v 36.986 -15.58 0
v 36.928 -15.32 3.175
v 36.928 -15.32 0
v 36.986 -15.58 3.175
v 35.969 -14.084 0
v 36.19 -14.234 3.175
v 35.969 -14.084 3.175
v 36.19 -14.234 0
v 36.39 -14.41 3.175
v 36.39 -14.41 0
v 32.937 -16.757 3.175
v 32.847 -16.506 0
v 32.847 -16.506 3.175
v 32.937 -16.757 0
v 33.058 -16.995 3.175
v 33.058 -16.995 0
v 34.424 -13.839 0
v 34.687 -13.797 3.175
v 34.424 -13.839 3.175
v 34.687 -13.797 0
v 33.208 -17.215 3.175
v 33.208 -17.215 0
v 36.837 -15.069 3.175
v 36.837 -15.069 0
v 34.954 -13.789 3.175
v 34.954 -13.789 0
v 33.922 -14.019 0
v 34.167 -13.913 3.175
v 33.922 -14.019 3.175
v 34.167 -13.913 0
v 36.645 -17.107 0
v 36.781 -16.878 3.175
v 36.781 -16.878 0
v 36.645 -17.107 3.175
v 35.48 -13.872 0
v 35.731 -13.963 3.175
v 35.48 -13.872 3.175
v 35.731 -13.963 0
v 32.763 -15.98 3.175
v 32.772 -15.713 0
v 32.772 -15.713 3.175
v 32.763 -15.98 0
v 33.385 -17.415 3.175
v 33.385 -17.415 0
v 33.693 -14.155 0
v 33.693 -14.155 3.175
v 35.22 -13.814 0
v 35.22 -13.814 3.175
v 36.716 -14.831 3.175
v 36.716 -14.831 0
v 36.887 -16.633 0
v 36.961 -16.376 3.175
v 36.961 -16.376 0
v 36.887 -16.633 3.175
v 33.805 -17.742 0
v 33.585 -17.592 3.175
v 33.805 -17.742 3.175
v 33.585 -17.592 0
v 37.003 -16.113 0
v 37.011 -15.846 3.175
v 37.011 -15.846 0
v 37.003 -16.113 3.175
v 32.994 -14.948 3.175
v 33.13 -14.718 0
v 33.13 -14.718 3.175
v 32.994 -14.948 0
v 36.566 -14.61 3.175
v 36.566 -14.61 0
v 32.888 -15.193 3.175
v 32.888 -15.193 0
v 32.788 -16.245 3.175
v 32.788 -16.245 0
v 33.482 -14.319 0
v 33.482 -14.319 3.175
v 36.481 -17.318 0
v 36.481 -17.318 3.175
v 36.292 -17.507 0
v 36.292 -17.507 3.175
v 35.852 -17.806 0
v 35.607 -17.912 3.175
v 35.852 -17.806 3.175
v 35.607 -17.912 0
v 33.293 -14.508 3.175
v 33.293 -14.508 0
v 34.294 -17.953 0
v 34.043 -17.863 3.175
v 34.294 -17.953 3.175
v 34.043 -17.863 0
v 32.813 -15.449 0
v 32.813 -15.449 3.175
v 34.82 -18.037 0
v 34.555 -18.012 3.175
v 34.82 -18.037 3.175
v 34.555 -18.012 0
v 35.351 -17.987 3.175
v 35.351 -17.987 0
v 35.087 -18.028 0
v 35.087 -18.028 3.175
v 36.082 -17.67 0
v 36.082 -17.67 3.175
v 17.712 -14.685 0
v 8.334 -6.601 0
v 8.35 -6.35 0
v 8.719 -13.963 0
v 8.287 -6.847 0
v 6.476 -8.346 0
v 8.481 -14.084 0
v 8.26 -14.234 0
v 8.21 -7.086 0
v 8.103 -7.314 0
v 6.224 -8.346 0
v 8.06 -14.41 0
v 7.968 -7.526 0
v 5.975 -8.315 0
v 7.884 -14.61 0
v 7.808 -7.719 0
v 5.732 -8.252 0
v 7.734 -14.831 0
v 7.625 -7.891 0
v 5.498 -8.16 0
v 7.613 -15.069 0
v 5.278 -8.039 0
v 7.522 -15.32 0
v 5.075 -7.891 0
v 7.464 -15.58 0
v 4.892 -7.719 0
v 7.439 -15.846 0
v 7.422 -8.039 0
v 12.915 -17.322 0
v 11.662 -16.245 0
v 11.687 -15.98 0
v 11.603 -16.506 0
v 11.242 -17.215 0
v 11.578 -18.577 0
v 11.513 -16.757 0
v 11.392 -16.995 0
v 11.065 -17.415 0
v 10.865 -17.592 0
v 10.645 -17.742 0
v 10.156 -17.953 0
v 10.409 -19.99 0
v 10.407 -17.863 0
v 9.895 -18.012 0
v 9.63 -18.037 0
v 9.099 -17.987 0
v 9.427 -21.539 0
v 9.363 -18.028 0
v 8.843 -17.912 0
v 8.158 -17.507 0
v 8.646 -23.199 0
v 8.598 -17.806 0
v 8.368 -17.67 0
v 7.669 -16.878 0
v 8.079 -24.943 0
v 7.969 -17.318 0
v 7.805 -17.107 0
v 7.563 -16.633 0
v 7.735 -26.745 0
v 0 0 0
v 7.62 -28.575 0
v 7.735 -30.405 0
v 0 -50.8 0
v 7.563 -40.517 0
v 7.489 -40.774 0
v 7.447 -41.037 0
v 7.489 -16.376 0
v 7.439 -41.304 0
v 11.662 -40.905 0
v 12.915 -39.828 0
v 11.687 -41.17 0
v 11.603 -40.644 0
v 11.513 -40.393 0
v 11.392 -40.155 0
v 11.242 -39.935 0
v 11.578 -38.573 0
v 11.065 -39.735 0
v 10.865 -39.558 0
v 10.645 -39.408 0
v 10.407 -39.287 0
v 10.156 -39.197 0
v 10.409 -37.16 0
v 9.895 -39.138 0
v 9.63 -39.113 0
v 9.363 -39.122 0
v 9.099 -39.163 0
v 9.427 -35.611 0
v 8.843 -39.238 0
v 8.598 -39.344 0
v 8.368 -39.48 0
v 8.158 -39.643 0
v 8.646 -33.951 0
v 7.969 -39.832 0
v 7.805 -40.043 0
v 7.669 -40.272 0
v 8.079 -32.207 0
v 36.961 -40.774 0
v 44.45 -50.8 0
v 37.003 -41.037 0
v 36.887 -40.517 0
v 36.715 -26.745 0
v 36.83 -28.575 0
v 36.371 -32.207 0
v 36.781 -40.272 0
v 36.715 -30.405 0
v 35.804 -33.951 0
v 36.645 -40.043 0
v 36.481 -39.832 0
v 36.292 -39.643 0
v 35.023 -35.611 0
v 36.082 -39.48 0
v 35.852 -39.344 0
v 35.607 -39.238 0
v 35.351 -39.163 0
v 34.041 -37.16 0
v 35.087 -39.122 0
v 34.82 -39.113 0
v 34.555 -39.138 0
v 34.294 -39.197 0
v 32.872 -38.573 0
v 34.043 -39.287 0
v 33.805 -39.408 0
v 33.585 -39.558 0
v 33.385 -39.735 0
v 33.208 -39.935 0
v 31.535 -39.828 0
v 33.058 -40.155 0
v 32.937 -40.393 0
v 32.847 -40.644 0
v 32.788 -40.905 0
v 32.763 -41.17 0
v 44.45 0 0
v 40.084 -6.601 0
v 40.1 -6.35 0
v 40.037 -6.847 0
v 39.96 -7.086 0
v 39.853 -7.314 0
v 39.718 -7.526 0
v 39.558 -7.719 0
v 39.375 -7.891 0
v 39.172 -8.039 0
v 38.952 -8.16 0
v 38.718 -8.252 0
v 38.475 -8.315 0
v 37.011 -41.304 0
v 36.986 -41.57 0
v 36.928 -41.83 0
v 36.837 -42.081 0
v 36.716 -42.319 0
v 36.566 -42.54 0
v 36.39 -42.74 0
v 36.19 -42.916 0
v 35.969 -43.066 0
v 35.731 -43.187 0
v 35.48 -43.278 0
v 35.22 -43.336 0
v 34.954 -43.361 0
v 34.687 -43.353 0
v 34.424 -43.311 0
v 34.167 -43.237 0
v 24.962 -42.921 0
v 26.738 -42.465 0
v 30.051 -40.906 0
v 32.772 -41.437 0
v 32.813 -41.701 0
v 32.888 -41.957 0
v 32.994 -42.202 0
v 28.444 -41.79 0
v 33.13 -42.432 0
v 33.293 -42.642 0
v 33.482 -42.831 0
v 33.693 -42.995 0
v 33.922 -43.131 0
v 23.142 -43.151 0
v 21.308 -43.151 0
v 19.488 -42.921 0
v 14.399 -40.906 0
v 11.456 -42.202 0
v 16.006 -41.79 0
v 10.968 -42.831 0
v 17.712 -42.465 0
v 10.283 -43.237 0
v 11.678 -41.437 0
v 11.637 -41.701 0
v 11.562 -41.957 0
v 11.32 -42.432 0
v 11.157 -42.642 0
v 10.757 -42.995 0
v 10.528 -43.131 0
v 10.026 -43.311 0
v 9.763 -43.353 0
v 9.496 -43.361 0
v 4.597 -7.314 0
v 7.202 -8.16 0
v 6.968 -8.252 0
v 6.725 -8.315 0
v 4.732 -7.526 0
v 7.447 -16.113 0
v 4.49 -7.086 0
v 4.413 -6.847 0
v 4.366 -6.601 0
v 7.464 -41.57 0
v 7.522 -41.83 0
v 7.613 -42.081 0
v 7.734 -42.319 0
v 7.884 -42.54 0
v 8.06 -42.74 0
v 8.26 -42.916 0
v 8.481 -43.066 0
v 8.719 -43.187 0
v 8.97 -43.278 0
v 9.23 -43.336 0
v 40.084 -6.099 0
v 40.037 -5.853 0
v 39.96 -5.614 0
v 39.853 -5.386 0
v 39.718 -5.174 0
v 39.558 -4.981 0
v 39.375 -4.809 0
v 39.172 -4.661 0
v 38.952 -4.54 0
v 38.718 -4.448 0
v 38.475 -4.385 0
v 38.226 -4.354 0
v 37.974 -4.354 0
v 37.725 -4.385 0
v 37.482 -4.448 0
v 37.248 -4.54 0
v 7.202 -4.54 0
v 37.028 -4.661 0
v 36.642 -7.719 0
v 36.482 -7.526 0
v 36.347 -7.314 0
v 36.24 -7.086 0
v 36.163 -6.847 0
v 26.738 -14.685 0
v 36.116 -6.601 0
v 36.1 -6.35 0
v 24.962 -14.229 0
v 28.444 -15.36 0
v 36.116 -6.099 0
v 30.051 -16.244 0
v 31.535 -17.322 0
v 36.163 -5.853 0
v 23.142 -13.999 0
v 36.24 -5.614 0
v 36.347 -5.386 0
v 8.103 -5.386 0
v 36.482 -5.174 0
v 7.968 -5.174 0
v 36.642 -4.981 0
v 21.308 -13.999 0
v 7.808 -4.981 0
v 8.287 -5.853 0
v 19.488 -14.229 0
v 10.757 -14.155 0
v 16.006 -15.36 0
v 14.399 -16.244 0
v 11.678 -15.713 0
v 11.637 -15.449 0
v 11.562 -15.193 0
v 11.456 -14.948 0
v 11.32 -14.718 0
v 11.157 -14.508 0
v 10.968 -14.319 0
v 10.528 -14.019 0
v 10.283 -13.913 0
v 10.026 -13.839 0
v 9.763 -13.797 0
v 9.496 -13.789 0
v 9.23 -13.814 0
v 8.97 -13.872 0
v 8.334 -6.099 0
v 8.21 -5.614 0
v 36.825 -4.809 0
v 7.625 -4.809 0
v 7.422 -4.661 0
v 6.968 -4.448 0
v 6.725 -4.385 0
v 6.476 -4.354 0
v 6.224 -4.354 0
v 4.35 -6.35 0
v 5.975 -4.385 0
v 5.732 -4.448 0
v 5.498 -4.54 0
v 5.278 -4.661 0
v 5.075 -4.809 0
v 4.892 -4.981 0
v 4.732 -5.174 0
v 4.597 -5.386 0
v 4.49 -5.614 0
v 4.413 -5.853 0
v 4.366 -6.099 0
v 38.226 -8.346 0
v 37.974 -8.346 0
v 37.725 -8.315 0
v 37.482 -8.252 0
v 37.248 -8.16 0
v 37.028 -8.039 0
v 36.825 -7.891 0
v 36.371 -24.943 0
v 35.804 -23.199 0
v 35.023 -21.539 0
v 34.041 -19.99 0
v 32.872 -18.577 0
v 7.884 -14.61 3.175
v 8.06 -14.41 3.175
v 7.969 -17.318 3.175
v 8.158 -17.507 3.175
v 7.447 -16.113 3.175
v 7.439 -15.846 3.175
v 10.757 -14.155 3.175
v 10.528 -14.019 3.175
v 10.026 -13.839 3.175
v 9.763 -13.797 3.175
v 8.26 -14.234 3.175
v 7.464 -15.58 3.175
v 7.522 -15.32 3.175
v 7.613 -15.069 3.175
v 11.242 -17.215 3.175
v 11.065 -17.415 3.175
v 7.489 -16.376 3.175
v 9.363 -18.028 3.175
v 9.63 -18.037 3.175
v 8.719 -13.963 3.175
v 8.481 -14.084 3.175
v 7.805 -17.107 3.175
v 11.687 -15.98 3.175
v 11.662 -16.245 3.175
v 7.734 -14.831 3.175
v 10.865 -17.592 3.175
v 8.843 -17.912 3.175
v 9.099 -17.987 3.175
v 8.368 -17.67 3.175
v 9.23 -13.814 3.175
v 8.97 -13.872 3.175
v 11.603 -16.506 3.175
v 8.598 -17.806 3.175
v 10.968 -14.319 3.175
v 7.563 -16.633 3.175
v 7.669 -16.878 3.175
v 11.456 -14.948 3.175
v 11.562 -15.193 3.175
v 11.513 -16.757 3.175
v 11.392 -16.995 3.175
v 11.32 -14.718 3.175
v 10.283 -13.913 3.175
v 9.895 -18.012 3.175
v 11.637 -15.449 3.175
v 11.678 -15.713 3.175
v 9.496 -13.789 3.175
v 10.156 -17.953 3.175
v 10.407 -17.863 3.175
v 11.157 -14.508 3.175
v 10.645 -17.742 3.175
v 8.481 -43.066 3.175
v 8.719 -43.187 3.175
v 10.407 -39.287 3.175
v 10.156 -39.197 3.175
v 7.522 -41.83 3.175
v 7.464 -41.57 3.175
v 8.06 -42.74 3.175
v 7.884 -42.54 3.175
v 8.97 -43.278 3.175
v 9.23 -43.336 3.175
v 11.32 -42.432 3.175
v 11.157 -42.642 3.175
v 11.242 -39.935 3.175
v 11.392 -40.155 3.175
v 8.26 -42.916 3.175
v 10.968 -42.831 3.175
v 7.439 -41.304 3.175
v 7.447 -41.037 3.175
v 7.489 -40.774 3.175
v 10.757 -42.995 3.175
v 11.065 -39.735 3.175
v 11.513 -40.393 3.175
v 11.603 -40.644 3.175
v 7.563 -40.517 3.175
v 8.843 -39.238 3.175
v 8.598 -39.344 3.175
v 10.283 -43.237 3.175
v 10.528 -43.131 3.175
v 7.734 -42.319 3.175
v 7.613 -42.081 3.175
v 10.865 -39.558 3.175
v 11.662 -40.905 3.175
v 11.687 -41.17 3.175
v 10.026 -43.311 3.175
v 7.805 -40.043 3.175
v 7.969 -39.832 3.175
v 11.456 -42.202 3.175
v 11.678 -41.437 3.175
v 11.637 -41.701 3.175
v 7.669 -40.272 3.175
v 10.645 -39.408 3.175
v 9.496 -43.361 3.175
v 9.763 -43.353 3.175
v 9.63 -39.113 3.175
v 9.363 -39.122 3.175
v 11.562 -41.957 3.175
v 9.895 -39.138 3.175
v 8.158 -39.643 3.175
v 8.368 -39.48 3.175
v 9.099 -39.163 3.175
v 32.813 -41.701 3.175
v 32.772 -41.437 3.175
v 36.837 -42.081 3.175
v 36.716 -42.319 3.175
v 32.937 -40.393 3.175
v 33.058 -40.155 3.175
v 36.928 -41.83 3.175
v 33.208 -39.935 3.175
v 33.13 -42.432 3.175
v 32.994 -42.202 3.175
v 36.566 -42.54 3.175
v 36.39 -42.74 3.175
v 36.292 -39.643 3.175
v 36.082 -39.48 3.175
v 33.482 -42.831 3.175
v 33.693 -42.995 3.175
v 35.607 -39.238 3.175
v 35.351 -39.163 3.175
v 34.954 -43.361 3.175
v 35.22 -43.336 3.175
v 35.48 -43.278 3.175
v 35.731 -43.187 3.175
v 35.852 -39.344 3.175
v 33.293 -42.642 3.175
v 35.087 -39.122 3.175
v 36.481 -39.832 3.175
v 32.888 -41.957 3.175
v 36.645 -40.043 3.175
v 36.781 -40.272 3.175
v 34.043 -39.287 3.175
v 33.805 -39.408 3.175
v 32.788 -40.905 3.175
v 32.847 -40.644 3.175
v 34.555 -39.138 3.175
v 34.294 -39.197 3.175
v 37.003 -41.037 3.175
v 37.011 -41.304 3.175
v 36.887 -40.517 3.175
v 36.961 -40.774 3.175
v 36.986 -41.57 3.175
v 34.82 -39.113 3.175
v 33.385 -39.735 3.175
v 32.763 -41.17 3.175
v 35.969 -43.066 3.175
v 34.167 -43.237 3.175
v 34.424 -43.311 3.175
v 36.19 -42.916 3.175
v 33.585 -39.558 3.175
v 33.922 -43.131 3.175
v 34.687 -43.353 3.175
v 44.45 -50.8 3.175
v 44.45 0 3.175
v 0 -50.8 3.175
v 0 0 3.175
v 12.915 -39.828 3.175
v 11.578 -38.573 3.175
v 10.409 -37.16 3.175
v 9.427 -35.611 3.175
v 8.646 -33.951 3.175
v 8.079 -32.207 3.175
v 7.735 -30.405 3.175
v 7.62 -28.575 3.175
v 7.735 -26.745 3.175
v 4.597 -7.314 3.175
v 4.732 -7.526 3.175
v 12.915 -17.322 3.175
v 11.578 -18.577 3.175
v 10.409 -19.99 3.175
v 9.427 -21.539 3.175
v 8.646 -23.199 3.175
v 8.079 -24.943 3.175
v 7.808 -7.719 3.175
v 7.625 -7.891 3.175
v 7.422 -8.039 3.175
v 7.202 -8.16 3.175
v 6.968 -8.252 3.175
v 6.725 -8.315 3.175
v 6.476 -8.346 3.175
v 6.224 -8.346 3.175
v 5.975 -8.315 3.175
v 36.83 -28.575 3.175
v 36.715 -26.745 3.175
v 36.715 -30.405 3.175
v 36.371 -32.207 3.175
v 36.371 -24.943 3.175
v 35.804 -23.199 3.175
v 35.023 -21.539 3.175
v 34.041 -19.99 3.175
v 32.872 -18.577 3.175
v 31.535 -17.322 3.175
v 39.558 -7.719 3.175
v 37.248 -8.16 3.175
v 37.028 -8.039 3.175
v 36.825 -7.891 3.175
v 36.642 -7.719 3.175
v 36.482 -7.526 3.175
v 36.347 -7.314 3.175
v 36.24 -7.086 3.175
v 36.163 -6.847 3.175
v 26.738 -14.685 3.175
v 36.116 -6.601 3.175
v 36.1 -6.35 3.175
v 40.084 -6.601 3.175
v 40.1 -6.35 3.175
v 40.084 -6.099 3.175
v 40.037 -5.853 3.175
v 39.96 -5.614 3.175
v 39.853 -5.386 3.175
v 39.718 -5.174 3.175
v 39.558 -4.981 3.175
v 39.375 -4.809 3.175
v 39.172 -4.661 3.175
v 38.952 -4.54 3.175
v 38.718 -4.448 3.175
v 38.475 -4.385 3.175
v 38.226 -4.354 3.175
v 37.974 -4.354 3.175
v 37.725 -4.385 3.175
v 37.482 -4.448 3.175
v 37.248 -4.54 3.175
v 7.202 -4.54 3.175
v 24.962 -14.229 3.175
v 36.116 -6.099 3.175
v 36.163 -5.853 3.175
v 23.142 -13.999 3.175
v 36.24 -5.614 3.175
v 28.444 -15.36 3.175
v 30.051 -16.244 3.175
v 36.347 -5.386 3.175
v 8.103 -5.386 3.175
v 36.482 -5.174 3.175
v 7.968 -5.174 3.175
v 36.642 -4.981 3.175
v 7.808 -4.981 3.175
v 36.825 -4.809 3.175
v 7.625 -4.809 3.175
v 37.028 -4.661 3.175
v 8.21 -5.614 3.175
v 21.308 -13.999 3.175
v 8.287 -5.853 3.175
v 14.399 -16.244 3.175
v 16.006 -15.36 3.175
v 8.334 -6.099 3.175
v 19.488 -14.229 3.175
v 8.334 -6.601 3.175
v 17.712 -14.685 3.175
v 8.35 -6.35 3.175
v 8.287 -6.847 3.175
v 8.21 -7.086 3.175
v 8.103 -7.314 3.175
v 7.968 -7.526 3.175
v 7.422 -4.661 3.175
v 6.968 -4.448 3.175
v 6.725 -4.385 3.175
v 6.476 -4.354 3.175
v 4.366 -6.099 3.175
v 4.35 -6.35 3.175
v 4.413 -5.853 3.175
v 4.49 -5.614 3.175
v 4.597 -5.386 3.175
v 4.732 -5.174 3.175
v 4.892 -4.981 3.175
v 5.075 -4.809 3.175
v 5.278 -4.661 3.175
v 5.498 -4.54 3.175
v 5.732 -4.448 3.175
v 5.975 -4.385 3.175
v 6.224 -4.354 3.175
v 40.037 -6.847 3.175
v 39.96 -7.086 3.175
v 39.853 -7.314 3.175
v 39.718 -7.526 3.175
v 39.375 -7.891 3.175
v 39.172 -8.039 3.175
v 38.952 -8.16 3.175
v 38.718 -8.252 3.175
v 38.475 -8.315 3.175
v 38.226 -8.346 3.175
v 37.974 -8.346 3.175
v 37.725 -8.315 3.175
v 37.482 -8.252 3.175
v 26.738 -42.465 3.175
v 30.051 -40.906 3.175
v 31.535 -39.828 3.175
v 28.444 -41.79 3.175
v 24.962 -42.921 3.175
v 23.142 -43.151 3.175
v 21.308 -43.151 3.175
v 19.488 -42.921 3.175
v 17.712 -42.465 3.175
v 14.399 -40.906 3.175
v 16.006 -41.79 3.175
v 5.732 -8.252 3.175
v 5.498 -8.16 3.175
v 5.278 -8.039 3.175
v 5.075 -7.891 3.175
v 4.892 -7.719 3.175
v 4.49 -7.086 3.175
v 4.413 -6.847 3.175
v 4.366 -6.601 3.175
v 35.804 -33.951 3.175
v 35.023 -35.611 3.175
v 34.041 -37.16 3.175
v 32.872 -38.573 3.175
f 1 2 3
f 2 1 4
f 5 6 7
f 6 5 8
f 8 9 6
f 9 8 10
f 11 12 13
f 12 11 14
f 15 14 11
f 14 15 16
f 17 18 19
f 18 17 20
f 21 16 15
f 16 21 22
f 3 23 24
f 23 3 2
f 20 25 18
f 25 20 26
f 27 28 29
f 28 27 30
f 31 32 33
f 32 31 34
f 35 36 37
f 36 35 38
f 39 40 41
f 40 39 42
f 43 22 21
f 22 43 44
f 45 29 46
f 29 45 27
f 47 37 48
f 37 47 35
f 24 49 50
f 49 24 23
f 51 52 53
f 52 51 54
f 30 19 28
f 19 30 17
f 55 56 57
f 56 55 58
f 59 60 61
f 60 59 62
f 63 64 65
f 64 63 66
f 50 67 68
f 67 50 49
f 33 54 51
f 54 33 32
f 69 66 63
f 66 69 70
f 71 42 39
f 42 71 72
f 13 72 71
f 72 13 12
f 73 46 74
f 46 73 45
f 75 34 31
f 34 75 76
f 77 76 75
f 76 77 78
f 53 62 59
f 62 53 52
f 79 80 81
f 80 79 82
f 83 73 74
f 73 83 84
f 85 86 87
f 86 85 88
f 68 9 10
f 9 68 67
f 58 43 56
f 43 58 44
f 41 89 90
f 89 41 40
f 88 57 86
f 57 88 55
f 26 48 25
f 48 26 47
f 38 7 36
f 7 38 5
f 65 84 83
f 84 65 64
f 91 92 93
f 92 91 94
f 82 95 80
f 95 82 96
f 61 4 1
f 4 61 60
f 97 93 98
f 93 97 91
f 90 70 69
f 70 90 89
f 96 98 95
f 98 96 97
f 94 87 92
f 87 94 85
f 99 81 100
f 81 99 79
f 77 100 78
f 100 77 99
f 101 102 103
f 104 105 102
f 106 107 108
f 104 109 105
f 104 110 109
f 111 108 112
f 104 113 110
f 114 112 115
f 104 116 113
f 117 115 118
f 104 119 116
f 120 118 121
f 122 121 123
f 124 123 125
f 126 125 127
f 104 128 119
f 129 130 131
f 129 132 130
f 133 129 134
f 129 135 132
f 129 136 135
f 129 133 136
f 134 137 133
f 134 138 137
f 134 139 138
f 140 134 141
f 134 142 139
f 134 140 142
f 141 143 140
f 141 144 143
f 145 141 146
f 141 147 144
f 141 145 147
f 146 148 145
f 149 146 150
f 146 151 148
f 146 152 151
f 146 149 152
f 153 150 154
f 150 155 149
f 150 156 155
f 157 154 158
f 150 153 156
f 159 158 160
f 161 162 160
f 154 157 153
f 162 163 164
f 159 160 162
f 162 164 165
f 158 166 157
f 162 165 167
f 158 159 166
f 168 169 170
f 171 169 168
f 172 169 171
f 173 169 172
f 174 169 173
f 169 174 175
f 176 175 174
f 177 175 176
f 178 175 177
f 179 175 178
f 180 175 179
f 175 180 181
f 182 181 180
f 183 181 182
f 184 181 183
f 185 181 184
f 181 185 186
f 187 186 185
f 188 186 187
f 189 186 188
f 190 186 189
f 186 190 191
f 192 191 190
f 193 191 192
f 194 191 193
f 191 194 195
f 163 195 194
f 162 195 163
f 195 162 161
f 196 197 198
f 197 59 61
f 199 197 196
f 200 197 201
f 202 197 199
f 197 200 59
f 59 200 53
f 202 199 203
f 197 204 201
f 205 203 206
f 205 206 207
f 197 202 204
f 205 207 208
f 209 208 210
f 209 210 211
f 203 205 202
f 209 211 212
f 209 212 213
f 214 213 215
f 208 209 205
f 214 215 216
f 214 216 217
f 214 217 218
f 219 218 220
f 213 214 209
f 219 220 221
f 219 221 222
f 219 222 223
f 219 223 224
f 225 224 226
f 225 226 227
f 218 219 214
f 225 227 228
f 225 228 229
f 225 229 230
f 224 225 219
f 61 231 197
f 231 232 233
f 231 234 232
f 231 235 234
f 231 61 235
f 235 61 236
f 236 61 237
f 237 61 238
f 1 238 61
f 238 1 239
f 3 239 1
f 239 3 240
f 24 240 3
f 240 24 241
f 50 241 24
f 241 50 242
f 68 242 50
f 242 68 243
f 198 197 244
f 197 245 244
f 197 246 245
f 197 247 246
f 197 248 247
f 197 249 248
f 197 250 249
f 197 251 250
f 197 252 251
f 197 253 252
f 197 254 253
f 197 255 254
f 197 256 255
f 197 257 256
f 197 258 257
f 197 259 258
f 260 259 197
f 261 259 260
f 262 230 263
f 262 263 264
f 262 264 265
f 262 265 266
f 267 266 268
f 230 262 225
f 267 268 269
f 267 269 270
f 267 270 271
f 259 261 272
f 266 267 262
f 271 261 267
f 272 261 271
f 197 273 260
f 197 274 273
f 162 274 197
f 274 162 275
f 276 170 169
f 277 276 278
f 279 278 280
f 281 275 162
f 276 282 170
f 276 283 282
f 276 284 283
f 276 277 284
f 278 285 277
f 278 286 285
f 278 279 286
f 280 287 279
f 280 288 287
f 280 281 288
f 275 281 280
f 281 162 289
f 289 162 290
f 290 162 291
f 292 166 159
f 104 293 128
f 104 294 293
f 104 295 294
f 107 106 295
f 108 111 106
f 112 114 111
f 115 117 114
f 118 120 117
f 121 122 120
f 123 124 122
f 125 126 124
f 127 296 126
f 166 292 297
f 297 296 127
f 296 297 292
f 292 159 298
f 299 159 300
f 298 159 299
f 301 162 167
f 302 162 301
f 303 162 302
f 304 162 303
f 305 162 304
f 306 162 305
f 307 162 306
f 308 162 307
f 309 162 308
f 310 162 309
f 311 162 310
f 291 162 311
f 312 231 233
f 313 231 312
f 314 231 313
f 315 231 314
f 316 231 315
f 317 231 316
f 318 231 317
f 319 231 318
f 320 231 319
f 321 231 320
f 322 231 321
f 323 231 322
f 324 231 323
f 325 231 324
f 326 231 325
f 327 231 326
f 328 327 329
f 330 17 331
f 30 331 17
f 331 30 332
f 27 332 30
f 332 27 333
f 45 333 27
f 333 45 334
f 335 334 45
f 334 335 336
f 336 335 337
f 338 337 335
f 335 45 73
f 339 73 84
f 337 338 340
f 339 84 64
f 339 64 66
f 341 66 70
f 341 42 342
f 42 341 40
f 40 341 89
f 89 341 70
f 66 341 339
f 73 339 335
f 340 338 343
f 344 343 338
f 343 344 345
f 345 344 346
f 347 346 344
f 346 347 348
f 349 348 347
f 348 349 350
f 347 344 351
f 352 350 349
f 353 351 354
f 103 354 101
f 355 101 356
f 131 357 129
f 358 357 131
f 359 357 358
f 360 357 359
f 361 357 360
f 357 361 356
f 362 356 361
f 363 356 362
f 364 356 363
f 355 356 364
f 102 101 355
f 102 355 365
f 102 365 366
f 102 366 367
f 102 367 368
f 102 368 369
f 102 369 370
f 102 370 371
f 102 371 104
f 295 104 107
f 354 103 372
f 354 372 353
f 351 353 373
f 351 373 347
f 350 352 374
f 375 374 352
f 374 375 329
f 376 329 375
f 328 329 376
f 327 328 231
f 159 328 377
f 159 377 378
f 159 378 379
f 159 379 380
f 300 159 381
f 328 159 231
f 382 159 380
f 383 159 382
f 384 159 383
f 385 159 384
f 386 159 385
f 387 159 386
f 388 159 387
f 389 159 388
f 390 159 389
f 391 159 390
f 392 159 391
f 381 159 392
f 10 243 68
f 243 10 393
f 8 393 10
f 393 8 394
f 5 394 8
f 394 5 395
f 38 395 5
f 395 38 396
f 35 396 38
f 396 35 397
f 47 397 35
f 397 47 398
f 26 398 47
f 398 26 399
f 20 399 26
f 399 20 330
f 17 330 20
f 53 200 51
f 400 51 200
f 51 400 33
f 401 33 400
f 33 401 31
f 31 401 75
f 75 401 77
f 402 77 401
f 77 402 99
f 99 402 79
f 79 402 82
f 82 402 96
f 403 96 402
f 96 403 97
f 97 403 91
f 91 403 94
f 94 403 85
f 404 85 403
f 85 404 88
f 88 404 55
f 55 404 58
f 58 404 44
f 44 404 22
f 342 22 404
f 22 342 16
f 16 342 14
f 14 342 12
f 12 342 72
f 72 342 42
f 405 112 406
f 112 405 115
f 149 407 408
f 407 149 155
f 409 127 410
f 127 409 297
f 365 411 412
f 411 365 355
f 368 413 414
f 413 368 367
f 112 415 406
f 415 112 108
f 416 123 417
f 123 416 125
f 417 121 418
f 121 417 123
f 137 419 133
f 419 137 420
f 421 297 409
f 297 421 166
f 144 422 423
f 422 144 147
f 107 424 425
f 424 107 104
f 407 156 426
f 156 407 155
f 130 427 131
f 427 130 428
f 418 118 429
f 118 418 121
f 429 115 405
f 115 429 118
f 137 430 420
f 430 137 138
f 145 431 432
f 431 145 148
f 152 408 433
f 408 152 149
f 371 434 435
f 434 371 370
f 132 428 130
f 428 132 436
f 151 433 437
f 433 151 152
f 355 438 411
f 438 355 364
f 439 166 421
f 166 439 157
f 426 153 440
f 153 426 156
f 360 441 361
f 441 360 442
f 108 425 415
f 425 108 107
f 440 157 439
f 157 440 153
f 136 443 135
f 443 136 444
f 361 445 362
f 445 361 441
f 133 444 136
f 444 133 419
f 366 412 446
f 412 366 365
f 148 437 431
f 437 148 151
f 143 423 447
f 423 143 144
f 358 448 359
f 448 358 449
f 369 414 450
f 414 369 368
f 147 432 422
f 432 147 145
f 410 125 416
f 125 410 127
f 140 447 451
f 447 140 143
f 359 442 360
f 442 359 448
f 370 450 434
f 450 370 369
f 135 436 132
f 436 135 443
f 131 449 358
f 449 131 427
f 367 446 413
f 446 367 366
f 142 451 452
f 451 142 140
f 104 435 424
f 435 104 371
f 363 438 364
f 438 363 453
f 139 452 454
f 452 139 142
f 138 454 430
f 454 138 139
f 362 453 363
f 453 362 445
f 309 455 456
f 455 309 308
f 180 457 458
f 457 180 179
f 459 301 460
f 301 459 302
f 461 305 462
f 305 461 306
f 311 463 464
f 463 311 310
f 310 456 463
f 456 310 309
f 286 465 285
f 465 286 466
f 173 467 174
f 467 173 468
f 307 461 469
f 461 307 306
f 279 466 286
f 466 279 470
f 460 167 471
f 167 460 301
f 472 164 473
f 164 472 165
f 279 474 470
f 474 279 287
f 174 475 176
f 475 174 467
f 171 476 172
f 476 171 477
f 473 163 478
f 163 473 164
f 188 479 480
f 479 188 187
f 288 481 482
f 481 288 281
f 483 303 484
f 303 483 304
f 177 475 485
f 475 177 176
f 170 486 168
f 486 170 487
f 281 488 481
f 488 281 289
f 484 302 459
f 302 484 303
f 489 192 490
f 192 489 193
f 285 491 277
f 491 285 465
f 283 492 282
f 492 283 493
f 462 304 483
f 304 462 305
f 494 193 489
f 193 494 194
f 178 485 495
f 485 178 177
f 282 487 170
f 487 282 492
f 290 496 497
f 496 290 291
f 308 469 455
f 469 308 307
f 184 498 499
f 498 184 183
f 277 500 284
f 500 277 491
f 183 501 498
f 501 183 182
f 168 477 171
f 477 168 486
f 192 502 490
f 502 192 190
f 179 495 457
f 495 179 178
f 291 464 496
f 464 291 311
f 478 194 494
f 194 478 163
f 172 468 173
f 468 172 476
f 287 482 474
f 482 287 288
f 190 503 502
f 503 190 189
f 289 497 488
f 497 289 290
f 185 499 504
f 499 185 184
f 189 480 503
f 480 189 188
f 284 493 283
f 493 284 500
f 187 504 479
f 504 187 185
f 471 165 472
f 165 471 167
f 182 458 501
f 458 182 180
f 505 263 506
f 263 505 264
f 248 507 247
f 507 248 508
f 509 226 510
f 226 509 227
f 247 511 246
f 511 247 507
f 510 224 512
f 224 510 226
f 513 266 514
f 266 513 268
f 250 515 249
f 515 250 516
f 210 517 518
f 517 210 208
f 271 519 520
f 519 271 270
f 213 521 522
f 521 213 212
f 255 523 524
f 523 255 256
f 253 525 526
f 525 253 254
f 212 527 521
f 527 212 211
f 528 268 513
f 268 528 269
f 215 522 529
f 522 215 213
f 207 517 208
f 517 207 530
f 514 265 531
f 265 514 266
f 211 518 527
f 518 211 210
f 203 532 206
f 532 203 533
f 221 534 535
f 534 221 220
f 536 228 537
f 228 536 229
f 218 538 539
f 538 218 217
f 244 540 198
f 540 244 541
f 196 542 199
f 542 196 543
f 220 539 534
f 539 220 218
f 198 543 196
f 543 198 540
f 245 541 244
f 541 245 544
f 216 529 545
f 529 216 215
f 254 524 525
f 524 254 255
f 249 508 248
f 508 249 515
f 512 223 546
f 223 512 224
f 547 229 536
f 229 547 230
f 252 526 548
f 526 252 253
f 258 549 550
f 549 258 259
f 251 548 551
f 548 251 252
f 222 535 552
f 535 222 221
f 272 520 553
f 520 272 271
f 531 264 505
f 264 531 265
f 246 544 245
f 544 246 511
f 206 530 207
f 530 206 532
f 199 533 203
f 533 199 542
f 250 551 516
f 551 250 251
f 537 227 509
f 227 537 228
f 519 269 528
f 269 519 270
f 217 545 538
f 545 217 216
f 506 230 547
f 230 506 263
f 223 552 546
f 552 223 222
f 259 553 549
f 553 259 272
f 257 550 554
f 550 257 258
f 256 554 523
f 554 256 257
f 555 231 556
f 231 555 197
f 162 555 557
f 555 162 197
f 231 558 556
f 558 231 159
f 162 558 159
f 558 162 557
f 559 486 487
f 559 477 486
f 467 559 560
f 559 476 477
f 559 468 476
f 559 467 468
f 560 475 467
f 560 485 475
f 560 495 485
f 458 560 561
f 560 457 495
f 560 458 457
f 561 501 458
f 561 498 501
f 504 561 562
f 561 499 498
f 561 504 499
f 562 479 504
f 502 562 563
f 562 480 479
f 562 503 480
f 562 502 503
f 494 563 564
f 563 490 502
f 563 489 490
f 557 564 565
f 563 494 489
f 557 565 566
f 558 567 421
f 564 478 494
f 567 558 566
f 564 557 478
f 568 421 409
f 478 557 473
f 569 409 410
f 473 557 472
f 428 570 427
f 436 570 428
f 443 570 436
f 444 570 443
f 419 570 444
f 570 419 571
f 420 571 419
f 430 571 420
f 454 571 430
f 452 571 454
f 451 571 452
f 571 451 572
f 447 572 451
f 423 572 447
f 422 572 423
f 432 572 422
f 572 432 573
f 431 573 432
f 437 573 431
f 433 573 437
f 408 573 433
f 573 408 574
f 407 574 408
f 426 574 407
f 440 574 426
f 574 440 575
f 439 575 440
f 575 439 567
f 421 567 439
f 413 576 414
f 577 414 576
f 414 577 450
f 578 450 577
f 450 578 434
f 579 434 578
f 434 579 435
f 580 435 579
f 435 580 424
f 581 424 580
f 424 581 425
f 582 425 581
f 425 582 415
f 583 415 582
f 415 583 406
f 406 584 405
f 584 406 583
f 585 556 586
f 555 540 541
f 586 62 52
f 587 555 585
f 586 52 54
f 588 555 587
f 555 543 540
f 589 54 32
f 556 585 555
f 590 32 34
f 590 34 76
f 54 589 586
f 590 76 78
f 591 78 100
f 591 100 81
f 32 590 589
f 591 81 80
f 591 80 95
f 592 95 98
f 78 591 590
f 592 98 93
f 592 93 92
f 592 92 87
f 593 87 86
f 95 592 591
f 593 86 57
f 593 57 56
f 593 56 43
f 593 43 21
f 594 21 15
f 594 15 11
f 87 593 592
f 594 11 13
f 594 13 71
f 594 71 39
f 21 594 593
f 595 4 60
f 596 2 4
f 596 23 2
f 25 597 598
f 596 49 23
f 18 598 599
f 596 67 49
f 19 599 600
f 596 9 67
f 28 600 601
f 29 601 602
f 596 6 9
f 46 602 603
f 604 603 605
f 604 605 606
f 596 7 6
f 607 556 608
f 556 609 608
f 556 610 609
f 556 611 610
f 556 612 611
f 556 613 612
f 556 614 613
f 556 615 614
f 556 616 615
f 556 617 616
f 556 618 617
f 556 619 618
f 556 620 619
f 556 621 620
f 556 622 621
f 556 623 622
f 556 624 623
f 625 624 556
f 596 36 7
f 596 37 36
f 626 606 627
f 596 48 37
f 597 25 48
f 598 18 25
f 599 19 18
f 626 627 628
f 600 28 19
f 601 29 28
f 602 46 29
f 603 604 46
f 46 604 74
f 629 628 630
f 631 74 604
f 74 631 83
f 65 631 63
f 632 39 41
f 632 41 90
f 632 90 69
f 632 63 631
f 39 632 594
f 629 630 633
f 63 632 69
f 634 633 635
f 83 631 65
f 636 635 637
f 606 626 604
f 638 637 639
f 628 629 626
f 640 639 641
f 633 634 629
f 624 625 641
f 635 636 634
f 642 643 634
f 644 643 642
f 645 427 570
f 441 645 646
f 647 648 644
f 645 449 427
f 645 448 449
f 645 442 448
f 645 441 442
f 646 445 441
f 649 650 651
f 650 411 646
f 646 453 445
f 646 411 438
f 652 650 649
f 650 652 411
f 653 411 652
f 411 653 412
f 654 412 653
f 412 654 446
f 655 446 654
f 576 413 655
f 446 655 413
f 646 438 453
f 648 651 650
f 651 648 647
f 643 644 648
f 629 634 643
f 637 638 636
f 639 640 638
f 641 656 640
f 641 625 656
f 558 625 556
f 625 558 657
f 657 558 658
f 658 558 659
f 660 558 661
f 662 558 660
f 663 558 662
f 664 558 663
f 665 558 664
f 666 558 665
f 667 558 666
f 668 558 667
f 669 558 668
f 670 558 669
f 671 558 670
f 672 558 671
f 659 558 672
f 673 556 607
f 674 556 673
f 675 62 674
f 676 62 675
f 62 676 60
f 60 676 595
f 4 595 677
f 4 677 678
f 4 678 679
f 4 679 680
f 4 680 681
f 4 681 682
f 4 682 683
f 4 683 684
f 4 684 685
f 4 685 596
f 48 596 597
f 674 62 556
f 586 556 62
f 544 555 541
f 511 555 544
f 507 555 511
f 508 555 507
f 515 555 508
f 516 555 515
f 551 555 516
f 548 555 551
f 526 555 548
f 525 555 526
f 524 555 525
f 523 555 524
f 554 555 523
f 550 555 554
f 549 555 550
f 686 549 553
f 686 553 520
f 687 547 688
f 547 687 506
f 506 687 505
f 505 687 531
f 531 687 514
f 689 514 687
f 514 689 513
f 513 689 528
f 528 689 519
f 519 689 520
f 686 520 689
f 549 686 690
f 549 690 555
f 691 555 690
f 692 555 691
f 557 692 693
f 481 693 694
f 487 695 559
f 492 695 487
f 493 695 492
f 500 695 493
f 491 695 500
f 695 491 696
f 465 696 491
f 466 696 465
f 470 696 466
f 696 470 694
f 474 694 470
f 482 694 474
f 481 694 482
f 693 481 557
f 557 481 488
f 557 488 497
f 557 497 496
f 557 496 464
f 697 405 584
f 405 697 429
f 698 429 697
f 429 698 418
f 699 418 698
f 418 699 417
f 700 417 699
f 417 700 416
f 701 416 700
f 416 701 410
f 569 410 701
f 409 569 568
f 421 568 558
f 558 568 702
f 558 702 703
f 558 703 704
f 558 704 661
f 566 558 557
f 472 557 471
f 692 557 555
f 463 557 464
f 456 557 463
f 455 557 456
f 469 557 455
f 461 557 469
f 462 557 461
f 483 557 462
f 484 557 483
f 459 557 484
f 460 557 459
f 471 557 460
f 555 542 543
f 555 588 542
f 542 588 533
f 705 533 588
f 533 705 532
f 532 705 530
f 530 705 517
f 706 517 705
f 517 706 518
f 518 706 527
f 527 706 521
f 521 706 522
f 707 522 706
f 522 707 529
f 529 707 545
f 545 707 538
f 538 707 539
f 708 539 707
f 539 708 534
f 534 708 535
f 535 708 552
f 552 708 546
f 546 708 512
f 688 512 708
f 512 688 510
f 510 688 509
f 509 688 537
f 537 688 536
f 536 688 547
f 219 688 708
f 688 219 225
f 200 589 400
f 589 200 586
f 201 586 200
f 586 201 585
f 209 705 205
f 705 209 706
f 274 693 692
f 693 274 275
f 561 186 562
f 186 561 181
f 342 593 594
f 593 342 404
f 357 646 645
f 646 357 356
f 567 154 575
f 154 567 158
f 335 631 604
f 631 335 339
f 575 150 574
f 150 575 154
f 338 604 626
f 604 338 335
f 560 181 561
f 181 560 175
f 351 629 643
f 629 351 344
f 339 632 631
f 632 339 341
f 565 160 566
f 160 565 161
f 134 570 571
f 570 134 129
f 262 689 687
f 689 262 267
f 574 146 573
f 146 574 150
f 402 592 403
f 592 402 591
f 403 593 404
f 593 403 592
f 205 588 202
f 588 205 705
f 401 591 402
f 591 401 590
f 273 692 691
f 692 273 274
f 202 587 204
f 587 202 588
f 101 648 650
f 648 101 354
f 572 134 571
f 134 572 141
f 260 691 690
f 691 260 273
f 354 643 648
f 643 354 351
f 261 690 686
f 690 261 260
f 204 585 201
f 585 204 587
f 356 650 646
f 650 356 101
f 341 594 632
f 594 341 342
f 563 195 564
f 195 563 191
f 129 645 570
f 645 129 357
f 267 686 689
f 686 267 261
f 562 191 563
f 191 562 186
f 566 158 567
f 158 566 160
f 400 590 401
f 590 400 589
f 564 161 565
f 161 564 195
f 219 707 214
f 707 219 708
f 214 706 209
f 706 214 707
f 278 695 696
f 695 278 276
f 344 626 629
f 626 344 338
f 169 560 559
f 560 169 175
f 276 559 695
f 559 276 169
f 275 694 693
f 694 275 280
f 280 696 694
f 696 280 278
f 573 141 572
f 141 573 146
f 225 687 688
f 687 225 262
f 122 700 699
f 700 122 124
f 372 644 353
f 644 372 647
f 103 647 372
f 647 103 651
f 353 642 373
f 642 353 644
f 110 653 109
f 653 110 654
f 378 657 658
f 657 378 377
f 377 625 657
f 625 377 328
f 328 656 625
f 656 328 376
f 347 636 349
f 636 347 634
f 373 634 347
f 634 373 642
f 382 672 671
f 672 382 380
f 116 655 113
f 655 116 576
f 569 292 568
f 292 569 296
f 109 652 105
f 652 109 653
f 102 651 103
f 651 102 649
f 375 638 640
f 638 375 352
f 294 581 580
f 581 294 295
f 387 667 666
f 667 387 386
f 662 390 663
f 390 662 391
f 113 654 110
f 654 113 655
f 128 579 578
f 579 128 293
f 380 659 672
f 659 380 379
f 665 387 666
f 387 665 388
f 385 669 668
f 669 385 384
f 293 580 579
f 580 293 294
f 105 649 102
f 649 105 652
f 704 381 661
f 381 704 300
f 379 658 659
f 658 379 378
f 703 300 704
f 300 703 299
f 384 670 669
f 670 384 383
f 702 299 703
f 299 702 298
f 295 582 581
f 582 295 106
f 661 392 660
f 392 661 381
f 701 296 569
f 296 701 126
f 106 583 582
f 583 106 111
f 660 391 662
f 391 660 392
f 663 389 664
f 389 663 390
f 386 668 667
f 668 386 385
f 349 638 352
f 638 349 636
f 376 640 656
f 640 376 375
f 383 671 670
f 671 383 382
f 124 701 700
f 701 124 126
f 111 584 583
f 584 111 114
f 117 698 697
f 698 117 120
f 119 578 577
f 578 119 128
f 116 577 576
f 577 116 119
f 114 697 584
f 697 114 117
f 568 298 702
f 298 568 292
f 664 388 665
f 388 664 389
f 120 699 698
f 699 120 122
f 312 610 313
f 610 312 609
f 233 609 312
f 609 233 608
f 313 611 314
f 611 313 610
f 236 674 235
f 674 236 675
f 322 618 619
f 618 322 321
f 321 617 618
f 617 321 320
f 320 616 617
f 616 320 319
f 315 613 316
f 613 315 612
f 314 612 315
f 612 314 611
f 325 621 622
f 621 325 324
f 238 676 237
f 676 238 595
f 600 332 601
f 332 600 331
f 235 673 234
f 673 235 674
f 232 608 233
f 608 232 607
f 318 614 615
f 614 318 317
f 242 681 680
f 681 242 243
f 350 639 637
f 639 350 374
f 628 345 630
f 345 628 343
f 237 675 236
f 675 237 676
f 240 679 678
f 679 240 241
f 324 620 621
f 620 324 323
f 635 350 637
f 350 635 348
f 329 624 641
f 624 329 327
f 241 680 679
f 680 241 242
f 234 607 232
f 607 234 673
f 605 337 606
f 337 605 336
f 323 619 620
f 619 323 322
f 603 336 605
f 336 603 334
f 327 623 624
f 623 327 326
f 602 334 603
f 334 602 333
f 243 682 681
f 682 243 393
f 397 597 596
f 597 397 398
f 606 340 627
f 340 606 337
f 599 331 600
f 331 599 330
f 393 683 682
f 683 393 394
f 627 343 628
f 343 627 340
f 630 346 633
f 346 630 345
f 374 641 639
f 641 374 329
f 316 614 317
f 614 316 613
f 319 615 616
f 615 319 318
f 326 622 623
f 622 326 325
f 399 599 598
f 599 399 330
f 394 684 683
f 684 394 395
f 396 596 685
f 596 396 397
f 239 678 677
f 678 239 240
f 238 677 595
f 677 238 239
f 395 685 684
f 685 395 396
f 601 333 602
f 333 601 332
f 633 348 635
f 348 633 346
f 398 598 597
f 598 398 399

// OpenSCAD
//mount for a andymark p71 gear box to fit in a 2"x2"x1/8"wall c-channel

in=25.4;
wbox=1.75*in;
lmotor=4*in;
face = in*1/8;
dmotor=1.772*in+2;
dshaft=1.15*in;  //large hole for the shaft surround
dholes=1.41*in; // diameter of mount holes in face
motorBoltDiam=4.25;  //diameter of the motor mount holes 
riser=in*1/4; //riser height
faceMountDiam = 4; //diameter of holes for mounting faceplate
faceMountDepth = face+0.5*in; //depth of holes for mounting faceplate.

module bolt_slots(inset=1*in, slot=1*in) {
        //bolt slots for mounting to c-channel
    bolt=0.19*in; //size of the bolt
    //#10 screw is 0.19in
    //#12 screw is 0.21in
    bolthead=0.44*in; //head size is .437", washer is .625"
    headheight=in*1/8;
    for (i=[-0.5*in, 0.5*in]) {
    translate([i+wbox/2, inset, riser-headheight]) 
        linear_extrude(h=wbox) {
            hull() {
                circle(d=bolthead);
                translate([0, slot]) circle(d=bolthead);
            }
        }
    translate([i+wbox/2, inset, 0]) 
        linear_extrude(h=riser) {
            hull() {
                circle(d=bolt);
                translate([0, slot]) circle(d=bolt);
            }
        }
    }

}


$fn=50;
*difference() {
    union() {
        #translate([-riser, 0, 0]) cube([riser, wbox, lmotor+face]);  //riser
        cube([wbox, wbox, lmotor+face]);  //faceplate plus upper sides
    }
        translate([wbox/2, 0, face]) cube([wbox/2, wbox, lmotor]); //remove upper extensions
        translate([wbox/2, wbox/2, face]) cylinder(d=dmotor, h=lmotor);
        translate([wbox/2, wbox/2, 0]) cylinder(d=dshaft, h=lmotor);
        for (i=[45, 135, 225, 315]) {
            translate([wbox/2, wbox/2, 0]) rotate([0, 0, i]) translate([dholes/2, 0, 0]) cylinder(d=4, h=lmotor);
        }
        for (i=[0.25*in, wbox-0.25*in]) {
            depth=wbox; //0.3*in;
            #translate([i, depth, face/2]) rotate([90, 0, 0]) cylinder(d=3, h=depth);
        }
}

rotate([90, 0, 0])
difference() {
    cube([wbox, face+lmotor, riser+wbox]); 
    translate([0, face, wbox/2]) cube([wbox, lmotor, riser+wbox/2]); //remove the upper box half
    translate([wbox/2, face, riser+wbox/2]) rotate([-90, 0, 0]) cylinder(d=dmotor, h=lmotor); //make room for the motor
    translate([wbox/2, 0, riser+wbox/2]) rotate([-90, 0, 0]) cylinder(d=dshaft, h=face*2); //cut out the shaft hole
    for (i=[45, 135, 225, 315]) {
        translate([wbox/2, 0, riser+wbox/2]) rotate([-90, i, 0])  translate([dholes/2, 0, 0]) cylinder(d=motorBoltDiam, h=lmotor);
    }
    //faceplate base mount holes
    base_holes=4;
    translate([0.25*in, 0, 0.25*in]) rotate([-90, 0, 0]) cylinder(d=faceMountDiam, h=faceMountDepth);
    translate([wbox-0.25*in, 0, 0.25*in]) rotate([-90, 0, 0]) cylinder(d=faceMountDiam, h=faceMountDepth);
    
    //original was 1.5 and 1
    //bolt_slots(inset=1.5*in, slot=1*in);
  *  bolt_slots(inset=2.25*in, slot=0.75*in);
    inset=2*in;
    slot=1*in;
    
    // this puts tappable holes on the sides for mounting
    inset=face+0.5*in;
    depth=wbox;
    //diameters : in*13/64 = 1/4
    //              in*5/32 = #10
    //              3.4544mm = #8
    diam=3.4544;
    height=in*1/4;
  *  #translate([wbox-depth, face+inset, height]) rotate([0, 90, 0]) cylinder(d=diam, h=depth);
  *  #translate([wbox-depth, face+lmotor-inset, height]) rotate([0, 90, 0]) cylinder(d=diam, h=depth);
    
    //chop off the whole riser and just keep the faceplate
  #  translate([0, face, 0]) cube([wbox, lmotor, riser+wbox]);
}
